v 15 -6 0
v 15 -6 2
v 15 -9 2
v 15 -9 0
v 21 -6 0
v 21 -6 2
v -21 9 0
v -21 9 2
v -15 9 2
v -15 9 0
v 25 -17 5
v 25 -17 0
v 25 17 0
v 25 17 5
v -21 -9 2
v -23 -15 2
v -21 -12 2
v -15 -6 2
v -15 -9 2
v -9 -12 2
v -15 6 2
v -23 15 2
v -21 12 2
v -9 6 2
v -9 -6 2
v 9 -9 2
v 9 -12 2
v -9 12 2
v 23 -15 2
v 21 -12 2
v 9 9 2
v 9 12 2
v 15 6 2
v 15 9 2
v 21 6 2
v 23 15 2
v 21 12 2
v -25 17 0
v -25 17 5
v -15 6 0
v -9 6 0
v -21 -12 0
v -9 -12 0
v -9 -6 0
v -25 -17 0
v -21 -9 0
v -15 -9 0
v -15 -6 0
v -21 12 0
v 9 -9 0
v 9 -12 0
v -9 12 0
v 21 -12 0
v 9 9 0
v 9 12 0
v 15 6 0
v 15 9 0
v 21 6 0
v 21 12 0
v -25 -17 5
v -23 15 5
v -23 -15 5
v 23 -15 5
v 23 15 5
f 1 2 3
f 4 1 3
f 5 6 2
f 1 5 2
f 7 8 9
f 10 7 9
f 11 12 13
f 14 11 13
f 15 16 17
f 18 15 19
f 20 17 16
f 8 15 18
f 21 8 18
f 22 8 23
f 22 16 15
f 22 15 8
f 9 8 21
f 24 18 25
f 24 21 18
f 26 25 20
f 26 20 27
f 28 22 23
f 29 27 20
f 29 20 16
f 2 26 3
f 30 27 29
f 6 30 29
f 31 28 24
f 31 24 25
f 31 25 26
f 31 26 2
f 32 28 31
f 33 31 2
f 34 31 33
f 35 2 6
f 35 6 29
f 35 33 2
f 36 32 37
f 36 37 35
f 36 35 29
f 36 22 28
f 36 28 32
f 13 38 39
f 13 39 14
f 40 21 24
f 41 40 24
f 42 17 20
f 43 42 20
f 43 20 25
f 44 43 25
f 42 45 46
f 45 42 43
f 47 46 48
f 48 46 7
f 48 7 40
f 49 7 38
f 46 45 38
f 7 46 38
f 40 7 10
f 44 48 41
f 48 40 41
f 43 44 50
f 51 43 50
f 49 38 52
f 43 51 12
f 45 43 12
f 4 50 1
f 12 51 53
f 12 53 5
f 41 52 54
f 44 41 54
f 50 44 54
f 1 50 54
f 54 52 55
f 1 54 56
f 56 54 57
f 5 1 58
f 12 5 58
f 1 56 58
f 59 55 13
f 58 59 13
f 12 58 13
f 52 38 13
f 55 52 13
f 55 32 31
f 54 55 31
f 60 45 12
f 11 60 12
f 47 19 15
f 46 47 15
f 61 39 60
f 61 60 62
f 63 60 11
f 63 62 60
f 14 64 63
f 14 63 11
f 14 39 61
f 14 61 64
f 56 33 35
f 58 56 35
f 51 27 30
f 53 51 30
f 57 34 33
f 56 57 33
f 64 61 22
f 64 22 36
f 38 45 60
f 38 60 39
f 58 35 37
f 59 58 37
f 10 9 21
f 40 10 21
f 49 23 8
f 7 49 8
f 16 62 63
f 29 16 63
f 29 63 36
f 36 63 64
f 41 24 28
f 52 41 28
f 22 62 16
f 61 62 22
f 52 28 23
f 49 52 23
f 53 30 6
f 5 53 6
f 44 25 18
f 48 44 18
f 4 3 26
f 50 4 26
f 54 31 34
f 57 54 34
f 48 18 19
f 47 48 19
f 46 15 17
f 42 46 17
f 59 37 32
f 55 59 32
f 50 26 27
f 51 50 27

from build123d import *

# Parameters (mm, degrees)
F0_W     = 50
F0_H     = 34
F1_DEPTH = 5
F2_W     = 46
F2_H     = 30
F3_DEPTH = 3
F5_DEPTH = 2


with BuildPart() as f1:
    # F0 (on Top) → F1 (new body)
    with BuildSketch(Plane.XY):
        Rectangle(F0_W, F0_H)
    extrude(amount=F1_DEPTH)

    # F2 (on face) → F3 (cut)
    with BuildSketch(Plane.XY.offset(5)):
        Rectangle(F2_W, F2_H)
    extrude(amount=-F3_DEPTH, mode=Mode.SUBTRACT)

    # F4 (on face) → F5 (cut)
    with BuildSketch(Plane.XY.offset(2)):
        Polygon((-9, 12), (-21, 12), (-21, 9), (-15, 9), (-15, 6), (-9, 6), align=None)
        Polygon((21, 12), (9, 12), (9, 9), (15, 9), (15, 6), (21, 6), align=None)
        Polygon((-15, -9), (-21, -9), (-21, -12), (-9, -12), (-9, -6), (-15, -6), align=None)
        Polygon((15, -9), (9, -9), (9, -12), (21, -12), (21, -6), (15, -6), align=None)
    extrude(amount=-F5_DEPTH, mode=Mode.SUBTRACT)


solid = f1.part
